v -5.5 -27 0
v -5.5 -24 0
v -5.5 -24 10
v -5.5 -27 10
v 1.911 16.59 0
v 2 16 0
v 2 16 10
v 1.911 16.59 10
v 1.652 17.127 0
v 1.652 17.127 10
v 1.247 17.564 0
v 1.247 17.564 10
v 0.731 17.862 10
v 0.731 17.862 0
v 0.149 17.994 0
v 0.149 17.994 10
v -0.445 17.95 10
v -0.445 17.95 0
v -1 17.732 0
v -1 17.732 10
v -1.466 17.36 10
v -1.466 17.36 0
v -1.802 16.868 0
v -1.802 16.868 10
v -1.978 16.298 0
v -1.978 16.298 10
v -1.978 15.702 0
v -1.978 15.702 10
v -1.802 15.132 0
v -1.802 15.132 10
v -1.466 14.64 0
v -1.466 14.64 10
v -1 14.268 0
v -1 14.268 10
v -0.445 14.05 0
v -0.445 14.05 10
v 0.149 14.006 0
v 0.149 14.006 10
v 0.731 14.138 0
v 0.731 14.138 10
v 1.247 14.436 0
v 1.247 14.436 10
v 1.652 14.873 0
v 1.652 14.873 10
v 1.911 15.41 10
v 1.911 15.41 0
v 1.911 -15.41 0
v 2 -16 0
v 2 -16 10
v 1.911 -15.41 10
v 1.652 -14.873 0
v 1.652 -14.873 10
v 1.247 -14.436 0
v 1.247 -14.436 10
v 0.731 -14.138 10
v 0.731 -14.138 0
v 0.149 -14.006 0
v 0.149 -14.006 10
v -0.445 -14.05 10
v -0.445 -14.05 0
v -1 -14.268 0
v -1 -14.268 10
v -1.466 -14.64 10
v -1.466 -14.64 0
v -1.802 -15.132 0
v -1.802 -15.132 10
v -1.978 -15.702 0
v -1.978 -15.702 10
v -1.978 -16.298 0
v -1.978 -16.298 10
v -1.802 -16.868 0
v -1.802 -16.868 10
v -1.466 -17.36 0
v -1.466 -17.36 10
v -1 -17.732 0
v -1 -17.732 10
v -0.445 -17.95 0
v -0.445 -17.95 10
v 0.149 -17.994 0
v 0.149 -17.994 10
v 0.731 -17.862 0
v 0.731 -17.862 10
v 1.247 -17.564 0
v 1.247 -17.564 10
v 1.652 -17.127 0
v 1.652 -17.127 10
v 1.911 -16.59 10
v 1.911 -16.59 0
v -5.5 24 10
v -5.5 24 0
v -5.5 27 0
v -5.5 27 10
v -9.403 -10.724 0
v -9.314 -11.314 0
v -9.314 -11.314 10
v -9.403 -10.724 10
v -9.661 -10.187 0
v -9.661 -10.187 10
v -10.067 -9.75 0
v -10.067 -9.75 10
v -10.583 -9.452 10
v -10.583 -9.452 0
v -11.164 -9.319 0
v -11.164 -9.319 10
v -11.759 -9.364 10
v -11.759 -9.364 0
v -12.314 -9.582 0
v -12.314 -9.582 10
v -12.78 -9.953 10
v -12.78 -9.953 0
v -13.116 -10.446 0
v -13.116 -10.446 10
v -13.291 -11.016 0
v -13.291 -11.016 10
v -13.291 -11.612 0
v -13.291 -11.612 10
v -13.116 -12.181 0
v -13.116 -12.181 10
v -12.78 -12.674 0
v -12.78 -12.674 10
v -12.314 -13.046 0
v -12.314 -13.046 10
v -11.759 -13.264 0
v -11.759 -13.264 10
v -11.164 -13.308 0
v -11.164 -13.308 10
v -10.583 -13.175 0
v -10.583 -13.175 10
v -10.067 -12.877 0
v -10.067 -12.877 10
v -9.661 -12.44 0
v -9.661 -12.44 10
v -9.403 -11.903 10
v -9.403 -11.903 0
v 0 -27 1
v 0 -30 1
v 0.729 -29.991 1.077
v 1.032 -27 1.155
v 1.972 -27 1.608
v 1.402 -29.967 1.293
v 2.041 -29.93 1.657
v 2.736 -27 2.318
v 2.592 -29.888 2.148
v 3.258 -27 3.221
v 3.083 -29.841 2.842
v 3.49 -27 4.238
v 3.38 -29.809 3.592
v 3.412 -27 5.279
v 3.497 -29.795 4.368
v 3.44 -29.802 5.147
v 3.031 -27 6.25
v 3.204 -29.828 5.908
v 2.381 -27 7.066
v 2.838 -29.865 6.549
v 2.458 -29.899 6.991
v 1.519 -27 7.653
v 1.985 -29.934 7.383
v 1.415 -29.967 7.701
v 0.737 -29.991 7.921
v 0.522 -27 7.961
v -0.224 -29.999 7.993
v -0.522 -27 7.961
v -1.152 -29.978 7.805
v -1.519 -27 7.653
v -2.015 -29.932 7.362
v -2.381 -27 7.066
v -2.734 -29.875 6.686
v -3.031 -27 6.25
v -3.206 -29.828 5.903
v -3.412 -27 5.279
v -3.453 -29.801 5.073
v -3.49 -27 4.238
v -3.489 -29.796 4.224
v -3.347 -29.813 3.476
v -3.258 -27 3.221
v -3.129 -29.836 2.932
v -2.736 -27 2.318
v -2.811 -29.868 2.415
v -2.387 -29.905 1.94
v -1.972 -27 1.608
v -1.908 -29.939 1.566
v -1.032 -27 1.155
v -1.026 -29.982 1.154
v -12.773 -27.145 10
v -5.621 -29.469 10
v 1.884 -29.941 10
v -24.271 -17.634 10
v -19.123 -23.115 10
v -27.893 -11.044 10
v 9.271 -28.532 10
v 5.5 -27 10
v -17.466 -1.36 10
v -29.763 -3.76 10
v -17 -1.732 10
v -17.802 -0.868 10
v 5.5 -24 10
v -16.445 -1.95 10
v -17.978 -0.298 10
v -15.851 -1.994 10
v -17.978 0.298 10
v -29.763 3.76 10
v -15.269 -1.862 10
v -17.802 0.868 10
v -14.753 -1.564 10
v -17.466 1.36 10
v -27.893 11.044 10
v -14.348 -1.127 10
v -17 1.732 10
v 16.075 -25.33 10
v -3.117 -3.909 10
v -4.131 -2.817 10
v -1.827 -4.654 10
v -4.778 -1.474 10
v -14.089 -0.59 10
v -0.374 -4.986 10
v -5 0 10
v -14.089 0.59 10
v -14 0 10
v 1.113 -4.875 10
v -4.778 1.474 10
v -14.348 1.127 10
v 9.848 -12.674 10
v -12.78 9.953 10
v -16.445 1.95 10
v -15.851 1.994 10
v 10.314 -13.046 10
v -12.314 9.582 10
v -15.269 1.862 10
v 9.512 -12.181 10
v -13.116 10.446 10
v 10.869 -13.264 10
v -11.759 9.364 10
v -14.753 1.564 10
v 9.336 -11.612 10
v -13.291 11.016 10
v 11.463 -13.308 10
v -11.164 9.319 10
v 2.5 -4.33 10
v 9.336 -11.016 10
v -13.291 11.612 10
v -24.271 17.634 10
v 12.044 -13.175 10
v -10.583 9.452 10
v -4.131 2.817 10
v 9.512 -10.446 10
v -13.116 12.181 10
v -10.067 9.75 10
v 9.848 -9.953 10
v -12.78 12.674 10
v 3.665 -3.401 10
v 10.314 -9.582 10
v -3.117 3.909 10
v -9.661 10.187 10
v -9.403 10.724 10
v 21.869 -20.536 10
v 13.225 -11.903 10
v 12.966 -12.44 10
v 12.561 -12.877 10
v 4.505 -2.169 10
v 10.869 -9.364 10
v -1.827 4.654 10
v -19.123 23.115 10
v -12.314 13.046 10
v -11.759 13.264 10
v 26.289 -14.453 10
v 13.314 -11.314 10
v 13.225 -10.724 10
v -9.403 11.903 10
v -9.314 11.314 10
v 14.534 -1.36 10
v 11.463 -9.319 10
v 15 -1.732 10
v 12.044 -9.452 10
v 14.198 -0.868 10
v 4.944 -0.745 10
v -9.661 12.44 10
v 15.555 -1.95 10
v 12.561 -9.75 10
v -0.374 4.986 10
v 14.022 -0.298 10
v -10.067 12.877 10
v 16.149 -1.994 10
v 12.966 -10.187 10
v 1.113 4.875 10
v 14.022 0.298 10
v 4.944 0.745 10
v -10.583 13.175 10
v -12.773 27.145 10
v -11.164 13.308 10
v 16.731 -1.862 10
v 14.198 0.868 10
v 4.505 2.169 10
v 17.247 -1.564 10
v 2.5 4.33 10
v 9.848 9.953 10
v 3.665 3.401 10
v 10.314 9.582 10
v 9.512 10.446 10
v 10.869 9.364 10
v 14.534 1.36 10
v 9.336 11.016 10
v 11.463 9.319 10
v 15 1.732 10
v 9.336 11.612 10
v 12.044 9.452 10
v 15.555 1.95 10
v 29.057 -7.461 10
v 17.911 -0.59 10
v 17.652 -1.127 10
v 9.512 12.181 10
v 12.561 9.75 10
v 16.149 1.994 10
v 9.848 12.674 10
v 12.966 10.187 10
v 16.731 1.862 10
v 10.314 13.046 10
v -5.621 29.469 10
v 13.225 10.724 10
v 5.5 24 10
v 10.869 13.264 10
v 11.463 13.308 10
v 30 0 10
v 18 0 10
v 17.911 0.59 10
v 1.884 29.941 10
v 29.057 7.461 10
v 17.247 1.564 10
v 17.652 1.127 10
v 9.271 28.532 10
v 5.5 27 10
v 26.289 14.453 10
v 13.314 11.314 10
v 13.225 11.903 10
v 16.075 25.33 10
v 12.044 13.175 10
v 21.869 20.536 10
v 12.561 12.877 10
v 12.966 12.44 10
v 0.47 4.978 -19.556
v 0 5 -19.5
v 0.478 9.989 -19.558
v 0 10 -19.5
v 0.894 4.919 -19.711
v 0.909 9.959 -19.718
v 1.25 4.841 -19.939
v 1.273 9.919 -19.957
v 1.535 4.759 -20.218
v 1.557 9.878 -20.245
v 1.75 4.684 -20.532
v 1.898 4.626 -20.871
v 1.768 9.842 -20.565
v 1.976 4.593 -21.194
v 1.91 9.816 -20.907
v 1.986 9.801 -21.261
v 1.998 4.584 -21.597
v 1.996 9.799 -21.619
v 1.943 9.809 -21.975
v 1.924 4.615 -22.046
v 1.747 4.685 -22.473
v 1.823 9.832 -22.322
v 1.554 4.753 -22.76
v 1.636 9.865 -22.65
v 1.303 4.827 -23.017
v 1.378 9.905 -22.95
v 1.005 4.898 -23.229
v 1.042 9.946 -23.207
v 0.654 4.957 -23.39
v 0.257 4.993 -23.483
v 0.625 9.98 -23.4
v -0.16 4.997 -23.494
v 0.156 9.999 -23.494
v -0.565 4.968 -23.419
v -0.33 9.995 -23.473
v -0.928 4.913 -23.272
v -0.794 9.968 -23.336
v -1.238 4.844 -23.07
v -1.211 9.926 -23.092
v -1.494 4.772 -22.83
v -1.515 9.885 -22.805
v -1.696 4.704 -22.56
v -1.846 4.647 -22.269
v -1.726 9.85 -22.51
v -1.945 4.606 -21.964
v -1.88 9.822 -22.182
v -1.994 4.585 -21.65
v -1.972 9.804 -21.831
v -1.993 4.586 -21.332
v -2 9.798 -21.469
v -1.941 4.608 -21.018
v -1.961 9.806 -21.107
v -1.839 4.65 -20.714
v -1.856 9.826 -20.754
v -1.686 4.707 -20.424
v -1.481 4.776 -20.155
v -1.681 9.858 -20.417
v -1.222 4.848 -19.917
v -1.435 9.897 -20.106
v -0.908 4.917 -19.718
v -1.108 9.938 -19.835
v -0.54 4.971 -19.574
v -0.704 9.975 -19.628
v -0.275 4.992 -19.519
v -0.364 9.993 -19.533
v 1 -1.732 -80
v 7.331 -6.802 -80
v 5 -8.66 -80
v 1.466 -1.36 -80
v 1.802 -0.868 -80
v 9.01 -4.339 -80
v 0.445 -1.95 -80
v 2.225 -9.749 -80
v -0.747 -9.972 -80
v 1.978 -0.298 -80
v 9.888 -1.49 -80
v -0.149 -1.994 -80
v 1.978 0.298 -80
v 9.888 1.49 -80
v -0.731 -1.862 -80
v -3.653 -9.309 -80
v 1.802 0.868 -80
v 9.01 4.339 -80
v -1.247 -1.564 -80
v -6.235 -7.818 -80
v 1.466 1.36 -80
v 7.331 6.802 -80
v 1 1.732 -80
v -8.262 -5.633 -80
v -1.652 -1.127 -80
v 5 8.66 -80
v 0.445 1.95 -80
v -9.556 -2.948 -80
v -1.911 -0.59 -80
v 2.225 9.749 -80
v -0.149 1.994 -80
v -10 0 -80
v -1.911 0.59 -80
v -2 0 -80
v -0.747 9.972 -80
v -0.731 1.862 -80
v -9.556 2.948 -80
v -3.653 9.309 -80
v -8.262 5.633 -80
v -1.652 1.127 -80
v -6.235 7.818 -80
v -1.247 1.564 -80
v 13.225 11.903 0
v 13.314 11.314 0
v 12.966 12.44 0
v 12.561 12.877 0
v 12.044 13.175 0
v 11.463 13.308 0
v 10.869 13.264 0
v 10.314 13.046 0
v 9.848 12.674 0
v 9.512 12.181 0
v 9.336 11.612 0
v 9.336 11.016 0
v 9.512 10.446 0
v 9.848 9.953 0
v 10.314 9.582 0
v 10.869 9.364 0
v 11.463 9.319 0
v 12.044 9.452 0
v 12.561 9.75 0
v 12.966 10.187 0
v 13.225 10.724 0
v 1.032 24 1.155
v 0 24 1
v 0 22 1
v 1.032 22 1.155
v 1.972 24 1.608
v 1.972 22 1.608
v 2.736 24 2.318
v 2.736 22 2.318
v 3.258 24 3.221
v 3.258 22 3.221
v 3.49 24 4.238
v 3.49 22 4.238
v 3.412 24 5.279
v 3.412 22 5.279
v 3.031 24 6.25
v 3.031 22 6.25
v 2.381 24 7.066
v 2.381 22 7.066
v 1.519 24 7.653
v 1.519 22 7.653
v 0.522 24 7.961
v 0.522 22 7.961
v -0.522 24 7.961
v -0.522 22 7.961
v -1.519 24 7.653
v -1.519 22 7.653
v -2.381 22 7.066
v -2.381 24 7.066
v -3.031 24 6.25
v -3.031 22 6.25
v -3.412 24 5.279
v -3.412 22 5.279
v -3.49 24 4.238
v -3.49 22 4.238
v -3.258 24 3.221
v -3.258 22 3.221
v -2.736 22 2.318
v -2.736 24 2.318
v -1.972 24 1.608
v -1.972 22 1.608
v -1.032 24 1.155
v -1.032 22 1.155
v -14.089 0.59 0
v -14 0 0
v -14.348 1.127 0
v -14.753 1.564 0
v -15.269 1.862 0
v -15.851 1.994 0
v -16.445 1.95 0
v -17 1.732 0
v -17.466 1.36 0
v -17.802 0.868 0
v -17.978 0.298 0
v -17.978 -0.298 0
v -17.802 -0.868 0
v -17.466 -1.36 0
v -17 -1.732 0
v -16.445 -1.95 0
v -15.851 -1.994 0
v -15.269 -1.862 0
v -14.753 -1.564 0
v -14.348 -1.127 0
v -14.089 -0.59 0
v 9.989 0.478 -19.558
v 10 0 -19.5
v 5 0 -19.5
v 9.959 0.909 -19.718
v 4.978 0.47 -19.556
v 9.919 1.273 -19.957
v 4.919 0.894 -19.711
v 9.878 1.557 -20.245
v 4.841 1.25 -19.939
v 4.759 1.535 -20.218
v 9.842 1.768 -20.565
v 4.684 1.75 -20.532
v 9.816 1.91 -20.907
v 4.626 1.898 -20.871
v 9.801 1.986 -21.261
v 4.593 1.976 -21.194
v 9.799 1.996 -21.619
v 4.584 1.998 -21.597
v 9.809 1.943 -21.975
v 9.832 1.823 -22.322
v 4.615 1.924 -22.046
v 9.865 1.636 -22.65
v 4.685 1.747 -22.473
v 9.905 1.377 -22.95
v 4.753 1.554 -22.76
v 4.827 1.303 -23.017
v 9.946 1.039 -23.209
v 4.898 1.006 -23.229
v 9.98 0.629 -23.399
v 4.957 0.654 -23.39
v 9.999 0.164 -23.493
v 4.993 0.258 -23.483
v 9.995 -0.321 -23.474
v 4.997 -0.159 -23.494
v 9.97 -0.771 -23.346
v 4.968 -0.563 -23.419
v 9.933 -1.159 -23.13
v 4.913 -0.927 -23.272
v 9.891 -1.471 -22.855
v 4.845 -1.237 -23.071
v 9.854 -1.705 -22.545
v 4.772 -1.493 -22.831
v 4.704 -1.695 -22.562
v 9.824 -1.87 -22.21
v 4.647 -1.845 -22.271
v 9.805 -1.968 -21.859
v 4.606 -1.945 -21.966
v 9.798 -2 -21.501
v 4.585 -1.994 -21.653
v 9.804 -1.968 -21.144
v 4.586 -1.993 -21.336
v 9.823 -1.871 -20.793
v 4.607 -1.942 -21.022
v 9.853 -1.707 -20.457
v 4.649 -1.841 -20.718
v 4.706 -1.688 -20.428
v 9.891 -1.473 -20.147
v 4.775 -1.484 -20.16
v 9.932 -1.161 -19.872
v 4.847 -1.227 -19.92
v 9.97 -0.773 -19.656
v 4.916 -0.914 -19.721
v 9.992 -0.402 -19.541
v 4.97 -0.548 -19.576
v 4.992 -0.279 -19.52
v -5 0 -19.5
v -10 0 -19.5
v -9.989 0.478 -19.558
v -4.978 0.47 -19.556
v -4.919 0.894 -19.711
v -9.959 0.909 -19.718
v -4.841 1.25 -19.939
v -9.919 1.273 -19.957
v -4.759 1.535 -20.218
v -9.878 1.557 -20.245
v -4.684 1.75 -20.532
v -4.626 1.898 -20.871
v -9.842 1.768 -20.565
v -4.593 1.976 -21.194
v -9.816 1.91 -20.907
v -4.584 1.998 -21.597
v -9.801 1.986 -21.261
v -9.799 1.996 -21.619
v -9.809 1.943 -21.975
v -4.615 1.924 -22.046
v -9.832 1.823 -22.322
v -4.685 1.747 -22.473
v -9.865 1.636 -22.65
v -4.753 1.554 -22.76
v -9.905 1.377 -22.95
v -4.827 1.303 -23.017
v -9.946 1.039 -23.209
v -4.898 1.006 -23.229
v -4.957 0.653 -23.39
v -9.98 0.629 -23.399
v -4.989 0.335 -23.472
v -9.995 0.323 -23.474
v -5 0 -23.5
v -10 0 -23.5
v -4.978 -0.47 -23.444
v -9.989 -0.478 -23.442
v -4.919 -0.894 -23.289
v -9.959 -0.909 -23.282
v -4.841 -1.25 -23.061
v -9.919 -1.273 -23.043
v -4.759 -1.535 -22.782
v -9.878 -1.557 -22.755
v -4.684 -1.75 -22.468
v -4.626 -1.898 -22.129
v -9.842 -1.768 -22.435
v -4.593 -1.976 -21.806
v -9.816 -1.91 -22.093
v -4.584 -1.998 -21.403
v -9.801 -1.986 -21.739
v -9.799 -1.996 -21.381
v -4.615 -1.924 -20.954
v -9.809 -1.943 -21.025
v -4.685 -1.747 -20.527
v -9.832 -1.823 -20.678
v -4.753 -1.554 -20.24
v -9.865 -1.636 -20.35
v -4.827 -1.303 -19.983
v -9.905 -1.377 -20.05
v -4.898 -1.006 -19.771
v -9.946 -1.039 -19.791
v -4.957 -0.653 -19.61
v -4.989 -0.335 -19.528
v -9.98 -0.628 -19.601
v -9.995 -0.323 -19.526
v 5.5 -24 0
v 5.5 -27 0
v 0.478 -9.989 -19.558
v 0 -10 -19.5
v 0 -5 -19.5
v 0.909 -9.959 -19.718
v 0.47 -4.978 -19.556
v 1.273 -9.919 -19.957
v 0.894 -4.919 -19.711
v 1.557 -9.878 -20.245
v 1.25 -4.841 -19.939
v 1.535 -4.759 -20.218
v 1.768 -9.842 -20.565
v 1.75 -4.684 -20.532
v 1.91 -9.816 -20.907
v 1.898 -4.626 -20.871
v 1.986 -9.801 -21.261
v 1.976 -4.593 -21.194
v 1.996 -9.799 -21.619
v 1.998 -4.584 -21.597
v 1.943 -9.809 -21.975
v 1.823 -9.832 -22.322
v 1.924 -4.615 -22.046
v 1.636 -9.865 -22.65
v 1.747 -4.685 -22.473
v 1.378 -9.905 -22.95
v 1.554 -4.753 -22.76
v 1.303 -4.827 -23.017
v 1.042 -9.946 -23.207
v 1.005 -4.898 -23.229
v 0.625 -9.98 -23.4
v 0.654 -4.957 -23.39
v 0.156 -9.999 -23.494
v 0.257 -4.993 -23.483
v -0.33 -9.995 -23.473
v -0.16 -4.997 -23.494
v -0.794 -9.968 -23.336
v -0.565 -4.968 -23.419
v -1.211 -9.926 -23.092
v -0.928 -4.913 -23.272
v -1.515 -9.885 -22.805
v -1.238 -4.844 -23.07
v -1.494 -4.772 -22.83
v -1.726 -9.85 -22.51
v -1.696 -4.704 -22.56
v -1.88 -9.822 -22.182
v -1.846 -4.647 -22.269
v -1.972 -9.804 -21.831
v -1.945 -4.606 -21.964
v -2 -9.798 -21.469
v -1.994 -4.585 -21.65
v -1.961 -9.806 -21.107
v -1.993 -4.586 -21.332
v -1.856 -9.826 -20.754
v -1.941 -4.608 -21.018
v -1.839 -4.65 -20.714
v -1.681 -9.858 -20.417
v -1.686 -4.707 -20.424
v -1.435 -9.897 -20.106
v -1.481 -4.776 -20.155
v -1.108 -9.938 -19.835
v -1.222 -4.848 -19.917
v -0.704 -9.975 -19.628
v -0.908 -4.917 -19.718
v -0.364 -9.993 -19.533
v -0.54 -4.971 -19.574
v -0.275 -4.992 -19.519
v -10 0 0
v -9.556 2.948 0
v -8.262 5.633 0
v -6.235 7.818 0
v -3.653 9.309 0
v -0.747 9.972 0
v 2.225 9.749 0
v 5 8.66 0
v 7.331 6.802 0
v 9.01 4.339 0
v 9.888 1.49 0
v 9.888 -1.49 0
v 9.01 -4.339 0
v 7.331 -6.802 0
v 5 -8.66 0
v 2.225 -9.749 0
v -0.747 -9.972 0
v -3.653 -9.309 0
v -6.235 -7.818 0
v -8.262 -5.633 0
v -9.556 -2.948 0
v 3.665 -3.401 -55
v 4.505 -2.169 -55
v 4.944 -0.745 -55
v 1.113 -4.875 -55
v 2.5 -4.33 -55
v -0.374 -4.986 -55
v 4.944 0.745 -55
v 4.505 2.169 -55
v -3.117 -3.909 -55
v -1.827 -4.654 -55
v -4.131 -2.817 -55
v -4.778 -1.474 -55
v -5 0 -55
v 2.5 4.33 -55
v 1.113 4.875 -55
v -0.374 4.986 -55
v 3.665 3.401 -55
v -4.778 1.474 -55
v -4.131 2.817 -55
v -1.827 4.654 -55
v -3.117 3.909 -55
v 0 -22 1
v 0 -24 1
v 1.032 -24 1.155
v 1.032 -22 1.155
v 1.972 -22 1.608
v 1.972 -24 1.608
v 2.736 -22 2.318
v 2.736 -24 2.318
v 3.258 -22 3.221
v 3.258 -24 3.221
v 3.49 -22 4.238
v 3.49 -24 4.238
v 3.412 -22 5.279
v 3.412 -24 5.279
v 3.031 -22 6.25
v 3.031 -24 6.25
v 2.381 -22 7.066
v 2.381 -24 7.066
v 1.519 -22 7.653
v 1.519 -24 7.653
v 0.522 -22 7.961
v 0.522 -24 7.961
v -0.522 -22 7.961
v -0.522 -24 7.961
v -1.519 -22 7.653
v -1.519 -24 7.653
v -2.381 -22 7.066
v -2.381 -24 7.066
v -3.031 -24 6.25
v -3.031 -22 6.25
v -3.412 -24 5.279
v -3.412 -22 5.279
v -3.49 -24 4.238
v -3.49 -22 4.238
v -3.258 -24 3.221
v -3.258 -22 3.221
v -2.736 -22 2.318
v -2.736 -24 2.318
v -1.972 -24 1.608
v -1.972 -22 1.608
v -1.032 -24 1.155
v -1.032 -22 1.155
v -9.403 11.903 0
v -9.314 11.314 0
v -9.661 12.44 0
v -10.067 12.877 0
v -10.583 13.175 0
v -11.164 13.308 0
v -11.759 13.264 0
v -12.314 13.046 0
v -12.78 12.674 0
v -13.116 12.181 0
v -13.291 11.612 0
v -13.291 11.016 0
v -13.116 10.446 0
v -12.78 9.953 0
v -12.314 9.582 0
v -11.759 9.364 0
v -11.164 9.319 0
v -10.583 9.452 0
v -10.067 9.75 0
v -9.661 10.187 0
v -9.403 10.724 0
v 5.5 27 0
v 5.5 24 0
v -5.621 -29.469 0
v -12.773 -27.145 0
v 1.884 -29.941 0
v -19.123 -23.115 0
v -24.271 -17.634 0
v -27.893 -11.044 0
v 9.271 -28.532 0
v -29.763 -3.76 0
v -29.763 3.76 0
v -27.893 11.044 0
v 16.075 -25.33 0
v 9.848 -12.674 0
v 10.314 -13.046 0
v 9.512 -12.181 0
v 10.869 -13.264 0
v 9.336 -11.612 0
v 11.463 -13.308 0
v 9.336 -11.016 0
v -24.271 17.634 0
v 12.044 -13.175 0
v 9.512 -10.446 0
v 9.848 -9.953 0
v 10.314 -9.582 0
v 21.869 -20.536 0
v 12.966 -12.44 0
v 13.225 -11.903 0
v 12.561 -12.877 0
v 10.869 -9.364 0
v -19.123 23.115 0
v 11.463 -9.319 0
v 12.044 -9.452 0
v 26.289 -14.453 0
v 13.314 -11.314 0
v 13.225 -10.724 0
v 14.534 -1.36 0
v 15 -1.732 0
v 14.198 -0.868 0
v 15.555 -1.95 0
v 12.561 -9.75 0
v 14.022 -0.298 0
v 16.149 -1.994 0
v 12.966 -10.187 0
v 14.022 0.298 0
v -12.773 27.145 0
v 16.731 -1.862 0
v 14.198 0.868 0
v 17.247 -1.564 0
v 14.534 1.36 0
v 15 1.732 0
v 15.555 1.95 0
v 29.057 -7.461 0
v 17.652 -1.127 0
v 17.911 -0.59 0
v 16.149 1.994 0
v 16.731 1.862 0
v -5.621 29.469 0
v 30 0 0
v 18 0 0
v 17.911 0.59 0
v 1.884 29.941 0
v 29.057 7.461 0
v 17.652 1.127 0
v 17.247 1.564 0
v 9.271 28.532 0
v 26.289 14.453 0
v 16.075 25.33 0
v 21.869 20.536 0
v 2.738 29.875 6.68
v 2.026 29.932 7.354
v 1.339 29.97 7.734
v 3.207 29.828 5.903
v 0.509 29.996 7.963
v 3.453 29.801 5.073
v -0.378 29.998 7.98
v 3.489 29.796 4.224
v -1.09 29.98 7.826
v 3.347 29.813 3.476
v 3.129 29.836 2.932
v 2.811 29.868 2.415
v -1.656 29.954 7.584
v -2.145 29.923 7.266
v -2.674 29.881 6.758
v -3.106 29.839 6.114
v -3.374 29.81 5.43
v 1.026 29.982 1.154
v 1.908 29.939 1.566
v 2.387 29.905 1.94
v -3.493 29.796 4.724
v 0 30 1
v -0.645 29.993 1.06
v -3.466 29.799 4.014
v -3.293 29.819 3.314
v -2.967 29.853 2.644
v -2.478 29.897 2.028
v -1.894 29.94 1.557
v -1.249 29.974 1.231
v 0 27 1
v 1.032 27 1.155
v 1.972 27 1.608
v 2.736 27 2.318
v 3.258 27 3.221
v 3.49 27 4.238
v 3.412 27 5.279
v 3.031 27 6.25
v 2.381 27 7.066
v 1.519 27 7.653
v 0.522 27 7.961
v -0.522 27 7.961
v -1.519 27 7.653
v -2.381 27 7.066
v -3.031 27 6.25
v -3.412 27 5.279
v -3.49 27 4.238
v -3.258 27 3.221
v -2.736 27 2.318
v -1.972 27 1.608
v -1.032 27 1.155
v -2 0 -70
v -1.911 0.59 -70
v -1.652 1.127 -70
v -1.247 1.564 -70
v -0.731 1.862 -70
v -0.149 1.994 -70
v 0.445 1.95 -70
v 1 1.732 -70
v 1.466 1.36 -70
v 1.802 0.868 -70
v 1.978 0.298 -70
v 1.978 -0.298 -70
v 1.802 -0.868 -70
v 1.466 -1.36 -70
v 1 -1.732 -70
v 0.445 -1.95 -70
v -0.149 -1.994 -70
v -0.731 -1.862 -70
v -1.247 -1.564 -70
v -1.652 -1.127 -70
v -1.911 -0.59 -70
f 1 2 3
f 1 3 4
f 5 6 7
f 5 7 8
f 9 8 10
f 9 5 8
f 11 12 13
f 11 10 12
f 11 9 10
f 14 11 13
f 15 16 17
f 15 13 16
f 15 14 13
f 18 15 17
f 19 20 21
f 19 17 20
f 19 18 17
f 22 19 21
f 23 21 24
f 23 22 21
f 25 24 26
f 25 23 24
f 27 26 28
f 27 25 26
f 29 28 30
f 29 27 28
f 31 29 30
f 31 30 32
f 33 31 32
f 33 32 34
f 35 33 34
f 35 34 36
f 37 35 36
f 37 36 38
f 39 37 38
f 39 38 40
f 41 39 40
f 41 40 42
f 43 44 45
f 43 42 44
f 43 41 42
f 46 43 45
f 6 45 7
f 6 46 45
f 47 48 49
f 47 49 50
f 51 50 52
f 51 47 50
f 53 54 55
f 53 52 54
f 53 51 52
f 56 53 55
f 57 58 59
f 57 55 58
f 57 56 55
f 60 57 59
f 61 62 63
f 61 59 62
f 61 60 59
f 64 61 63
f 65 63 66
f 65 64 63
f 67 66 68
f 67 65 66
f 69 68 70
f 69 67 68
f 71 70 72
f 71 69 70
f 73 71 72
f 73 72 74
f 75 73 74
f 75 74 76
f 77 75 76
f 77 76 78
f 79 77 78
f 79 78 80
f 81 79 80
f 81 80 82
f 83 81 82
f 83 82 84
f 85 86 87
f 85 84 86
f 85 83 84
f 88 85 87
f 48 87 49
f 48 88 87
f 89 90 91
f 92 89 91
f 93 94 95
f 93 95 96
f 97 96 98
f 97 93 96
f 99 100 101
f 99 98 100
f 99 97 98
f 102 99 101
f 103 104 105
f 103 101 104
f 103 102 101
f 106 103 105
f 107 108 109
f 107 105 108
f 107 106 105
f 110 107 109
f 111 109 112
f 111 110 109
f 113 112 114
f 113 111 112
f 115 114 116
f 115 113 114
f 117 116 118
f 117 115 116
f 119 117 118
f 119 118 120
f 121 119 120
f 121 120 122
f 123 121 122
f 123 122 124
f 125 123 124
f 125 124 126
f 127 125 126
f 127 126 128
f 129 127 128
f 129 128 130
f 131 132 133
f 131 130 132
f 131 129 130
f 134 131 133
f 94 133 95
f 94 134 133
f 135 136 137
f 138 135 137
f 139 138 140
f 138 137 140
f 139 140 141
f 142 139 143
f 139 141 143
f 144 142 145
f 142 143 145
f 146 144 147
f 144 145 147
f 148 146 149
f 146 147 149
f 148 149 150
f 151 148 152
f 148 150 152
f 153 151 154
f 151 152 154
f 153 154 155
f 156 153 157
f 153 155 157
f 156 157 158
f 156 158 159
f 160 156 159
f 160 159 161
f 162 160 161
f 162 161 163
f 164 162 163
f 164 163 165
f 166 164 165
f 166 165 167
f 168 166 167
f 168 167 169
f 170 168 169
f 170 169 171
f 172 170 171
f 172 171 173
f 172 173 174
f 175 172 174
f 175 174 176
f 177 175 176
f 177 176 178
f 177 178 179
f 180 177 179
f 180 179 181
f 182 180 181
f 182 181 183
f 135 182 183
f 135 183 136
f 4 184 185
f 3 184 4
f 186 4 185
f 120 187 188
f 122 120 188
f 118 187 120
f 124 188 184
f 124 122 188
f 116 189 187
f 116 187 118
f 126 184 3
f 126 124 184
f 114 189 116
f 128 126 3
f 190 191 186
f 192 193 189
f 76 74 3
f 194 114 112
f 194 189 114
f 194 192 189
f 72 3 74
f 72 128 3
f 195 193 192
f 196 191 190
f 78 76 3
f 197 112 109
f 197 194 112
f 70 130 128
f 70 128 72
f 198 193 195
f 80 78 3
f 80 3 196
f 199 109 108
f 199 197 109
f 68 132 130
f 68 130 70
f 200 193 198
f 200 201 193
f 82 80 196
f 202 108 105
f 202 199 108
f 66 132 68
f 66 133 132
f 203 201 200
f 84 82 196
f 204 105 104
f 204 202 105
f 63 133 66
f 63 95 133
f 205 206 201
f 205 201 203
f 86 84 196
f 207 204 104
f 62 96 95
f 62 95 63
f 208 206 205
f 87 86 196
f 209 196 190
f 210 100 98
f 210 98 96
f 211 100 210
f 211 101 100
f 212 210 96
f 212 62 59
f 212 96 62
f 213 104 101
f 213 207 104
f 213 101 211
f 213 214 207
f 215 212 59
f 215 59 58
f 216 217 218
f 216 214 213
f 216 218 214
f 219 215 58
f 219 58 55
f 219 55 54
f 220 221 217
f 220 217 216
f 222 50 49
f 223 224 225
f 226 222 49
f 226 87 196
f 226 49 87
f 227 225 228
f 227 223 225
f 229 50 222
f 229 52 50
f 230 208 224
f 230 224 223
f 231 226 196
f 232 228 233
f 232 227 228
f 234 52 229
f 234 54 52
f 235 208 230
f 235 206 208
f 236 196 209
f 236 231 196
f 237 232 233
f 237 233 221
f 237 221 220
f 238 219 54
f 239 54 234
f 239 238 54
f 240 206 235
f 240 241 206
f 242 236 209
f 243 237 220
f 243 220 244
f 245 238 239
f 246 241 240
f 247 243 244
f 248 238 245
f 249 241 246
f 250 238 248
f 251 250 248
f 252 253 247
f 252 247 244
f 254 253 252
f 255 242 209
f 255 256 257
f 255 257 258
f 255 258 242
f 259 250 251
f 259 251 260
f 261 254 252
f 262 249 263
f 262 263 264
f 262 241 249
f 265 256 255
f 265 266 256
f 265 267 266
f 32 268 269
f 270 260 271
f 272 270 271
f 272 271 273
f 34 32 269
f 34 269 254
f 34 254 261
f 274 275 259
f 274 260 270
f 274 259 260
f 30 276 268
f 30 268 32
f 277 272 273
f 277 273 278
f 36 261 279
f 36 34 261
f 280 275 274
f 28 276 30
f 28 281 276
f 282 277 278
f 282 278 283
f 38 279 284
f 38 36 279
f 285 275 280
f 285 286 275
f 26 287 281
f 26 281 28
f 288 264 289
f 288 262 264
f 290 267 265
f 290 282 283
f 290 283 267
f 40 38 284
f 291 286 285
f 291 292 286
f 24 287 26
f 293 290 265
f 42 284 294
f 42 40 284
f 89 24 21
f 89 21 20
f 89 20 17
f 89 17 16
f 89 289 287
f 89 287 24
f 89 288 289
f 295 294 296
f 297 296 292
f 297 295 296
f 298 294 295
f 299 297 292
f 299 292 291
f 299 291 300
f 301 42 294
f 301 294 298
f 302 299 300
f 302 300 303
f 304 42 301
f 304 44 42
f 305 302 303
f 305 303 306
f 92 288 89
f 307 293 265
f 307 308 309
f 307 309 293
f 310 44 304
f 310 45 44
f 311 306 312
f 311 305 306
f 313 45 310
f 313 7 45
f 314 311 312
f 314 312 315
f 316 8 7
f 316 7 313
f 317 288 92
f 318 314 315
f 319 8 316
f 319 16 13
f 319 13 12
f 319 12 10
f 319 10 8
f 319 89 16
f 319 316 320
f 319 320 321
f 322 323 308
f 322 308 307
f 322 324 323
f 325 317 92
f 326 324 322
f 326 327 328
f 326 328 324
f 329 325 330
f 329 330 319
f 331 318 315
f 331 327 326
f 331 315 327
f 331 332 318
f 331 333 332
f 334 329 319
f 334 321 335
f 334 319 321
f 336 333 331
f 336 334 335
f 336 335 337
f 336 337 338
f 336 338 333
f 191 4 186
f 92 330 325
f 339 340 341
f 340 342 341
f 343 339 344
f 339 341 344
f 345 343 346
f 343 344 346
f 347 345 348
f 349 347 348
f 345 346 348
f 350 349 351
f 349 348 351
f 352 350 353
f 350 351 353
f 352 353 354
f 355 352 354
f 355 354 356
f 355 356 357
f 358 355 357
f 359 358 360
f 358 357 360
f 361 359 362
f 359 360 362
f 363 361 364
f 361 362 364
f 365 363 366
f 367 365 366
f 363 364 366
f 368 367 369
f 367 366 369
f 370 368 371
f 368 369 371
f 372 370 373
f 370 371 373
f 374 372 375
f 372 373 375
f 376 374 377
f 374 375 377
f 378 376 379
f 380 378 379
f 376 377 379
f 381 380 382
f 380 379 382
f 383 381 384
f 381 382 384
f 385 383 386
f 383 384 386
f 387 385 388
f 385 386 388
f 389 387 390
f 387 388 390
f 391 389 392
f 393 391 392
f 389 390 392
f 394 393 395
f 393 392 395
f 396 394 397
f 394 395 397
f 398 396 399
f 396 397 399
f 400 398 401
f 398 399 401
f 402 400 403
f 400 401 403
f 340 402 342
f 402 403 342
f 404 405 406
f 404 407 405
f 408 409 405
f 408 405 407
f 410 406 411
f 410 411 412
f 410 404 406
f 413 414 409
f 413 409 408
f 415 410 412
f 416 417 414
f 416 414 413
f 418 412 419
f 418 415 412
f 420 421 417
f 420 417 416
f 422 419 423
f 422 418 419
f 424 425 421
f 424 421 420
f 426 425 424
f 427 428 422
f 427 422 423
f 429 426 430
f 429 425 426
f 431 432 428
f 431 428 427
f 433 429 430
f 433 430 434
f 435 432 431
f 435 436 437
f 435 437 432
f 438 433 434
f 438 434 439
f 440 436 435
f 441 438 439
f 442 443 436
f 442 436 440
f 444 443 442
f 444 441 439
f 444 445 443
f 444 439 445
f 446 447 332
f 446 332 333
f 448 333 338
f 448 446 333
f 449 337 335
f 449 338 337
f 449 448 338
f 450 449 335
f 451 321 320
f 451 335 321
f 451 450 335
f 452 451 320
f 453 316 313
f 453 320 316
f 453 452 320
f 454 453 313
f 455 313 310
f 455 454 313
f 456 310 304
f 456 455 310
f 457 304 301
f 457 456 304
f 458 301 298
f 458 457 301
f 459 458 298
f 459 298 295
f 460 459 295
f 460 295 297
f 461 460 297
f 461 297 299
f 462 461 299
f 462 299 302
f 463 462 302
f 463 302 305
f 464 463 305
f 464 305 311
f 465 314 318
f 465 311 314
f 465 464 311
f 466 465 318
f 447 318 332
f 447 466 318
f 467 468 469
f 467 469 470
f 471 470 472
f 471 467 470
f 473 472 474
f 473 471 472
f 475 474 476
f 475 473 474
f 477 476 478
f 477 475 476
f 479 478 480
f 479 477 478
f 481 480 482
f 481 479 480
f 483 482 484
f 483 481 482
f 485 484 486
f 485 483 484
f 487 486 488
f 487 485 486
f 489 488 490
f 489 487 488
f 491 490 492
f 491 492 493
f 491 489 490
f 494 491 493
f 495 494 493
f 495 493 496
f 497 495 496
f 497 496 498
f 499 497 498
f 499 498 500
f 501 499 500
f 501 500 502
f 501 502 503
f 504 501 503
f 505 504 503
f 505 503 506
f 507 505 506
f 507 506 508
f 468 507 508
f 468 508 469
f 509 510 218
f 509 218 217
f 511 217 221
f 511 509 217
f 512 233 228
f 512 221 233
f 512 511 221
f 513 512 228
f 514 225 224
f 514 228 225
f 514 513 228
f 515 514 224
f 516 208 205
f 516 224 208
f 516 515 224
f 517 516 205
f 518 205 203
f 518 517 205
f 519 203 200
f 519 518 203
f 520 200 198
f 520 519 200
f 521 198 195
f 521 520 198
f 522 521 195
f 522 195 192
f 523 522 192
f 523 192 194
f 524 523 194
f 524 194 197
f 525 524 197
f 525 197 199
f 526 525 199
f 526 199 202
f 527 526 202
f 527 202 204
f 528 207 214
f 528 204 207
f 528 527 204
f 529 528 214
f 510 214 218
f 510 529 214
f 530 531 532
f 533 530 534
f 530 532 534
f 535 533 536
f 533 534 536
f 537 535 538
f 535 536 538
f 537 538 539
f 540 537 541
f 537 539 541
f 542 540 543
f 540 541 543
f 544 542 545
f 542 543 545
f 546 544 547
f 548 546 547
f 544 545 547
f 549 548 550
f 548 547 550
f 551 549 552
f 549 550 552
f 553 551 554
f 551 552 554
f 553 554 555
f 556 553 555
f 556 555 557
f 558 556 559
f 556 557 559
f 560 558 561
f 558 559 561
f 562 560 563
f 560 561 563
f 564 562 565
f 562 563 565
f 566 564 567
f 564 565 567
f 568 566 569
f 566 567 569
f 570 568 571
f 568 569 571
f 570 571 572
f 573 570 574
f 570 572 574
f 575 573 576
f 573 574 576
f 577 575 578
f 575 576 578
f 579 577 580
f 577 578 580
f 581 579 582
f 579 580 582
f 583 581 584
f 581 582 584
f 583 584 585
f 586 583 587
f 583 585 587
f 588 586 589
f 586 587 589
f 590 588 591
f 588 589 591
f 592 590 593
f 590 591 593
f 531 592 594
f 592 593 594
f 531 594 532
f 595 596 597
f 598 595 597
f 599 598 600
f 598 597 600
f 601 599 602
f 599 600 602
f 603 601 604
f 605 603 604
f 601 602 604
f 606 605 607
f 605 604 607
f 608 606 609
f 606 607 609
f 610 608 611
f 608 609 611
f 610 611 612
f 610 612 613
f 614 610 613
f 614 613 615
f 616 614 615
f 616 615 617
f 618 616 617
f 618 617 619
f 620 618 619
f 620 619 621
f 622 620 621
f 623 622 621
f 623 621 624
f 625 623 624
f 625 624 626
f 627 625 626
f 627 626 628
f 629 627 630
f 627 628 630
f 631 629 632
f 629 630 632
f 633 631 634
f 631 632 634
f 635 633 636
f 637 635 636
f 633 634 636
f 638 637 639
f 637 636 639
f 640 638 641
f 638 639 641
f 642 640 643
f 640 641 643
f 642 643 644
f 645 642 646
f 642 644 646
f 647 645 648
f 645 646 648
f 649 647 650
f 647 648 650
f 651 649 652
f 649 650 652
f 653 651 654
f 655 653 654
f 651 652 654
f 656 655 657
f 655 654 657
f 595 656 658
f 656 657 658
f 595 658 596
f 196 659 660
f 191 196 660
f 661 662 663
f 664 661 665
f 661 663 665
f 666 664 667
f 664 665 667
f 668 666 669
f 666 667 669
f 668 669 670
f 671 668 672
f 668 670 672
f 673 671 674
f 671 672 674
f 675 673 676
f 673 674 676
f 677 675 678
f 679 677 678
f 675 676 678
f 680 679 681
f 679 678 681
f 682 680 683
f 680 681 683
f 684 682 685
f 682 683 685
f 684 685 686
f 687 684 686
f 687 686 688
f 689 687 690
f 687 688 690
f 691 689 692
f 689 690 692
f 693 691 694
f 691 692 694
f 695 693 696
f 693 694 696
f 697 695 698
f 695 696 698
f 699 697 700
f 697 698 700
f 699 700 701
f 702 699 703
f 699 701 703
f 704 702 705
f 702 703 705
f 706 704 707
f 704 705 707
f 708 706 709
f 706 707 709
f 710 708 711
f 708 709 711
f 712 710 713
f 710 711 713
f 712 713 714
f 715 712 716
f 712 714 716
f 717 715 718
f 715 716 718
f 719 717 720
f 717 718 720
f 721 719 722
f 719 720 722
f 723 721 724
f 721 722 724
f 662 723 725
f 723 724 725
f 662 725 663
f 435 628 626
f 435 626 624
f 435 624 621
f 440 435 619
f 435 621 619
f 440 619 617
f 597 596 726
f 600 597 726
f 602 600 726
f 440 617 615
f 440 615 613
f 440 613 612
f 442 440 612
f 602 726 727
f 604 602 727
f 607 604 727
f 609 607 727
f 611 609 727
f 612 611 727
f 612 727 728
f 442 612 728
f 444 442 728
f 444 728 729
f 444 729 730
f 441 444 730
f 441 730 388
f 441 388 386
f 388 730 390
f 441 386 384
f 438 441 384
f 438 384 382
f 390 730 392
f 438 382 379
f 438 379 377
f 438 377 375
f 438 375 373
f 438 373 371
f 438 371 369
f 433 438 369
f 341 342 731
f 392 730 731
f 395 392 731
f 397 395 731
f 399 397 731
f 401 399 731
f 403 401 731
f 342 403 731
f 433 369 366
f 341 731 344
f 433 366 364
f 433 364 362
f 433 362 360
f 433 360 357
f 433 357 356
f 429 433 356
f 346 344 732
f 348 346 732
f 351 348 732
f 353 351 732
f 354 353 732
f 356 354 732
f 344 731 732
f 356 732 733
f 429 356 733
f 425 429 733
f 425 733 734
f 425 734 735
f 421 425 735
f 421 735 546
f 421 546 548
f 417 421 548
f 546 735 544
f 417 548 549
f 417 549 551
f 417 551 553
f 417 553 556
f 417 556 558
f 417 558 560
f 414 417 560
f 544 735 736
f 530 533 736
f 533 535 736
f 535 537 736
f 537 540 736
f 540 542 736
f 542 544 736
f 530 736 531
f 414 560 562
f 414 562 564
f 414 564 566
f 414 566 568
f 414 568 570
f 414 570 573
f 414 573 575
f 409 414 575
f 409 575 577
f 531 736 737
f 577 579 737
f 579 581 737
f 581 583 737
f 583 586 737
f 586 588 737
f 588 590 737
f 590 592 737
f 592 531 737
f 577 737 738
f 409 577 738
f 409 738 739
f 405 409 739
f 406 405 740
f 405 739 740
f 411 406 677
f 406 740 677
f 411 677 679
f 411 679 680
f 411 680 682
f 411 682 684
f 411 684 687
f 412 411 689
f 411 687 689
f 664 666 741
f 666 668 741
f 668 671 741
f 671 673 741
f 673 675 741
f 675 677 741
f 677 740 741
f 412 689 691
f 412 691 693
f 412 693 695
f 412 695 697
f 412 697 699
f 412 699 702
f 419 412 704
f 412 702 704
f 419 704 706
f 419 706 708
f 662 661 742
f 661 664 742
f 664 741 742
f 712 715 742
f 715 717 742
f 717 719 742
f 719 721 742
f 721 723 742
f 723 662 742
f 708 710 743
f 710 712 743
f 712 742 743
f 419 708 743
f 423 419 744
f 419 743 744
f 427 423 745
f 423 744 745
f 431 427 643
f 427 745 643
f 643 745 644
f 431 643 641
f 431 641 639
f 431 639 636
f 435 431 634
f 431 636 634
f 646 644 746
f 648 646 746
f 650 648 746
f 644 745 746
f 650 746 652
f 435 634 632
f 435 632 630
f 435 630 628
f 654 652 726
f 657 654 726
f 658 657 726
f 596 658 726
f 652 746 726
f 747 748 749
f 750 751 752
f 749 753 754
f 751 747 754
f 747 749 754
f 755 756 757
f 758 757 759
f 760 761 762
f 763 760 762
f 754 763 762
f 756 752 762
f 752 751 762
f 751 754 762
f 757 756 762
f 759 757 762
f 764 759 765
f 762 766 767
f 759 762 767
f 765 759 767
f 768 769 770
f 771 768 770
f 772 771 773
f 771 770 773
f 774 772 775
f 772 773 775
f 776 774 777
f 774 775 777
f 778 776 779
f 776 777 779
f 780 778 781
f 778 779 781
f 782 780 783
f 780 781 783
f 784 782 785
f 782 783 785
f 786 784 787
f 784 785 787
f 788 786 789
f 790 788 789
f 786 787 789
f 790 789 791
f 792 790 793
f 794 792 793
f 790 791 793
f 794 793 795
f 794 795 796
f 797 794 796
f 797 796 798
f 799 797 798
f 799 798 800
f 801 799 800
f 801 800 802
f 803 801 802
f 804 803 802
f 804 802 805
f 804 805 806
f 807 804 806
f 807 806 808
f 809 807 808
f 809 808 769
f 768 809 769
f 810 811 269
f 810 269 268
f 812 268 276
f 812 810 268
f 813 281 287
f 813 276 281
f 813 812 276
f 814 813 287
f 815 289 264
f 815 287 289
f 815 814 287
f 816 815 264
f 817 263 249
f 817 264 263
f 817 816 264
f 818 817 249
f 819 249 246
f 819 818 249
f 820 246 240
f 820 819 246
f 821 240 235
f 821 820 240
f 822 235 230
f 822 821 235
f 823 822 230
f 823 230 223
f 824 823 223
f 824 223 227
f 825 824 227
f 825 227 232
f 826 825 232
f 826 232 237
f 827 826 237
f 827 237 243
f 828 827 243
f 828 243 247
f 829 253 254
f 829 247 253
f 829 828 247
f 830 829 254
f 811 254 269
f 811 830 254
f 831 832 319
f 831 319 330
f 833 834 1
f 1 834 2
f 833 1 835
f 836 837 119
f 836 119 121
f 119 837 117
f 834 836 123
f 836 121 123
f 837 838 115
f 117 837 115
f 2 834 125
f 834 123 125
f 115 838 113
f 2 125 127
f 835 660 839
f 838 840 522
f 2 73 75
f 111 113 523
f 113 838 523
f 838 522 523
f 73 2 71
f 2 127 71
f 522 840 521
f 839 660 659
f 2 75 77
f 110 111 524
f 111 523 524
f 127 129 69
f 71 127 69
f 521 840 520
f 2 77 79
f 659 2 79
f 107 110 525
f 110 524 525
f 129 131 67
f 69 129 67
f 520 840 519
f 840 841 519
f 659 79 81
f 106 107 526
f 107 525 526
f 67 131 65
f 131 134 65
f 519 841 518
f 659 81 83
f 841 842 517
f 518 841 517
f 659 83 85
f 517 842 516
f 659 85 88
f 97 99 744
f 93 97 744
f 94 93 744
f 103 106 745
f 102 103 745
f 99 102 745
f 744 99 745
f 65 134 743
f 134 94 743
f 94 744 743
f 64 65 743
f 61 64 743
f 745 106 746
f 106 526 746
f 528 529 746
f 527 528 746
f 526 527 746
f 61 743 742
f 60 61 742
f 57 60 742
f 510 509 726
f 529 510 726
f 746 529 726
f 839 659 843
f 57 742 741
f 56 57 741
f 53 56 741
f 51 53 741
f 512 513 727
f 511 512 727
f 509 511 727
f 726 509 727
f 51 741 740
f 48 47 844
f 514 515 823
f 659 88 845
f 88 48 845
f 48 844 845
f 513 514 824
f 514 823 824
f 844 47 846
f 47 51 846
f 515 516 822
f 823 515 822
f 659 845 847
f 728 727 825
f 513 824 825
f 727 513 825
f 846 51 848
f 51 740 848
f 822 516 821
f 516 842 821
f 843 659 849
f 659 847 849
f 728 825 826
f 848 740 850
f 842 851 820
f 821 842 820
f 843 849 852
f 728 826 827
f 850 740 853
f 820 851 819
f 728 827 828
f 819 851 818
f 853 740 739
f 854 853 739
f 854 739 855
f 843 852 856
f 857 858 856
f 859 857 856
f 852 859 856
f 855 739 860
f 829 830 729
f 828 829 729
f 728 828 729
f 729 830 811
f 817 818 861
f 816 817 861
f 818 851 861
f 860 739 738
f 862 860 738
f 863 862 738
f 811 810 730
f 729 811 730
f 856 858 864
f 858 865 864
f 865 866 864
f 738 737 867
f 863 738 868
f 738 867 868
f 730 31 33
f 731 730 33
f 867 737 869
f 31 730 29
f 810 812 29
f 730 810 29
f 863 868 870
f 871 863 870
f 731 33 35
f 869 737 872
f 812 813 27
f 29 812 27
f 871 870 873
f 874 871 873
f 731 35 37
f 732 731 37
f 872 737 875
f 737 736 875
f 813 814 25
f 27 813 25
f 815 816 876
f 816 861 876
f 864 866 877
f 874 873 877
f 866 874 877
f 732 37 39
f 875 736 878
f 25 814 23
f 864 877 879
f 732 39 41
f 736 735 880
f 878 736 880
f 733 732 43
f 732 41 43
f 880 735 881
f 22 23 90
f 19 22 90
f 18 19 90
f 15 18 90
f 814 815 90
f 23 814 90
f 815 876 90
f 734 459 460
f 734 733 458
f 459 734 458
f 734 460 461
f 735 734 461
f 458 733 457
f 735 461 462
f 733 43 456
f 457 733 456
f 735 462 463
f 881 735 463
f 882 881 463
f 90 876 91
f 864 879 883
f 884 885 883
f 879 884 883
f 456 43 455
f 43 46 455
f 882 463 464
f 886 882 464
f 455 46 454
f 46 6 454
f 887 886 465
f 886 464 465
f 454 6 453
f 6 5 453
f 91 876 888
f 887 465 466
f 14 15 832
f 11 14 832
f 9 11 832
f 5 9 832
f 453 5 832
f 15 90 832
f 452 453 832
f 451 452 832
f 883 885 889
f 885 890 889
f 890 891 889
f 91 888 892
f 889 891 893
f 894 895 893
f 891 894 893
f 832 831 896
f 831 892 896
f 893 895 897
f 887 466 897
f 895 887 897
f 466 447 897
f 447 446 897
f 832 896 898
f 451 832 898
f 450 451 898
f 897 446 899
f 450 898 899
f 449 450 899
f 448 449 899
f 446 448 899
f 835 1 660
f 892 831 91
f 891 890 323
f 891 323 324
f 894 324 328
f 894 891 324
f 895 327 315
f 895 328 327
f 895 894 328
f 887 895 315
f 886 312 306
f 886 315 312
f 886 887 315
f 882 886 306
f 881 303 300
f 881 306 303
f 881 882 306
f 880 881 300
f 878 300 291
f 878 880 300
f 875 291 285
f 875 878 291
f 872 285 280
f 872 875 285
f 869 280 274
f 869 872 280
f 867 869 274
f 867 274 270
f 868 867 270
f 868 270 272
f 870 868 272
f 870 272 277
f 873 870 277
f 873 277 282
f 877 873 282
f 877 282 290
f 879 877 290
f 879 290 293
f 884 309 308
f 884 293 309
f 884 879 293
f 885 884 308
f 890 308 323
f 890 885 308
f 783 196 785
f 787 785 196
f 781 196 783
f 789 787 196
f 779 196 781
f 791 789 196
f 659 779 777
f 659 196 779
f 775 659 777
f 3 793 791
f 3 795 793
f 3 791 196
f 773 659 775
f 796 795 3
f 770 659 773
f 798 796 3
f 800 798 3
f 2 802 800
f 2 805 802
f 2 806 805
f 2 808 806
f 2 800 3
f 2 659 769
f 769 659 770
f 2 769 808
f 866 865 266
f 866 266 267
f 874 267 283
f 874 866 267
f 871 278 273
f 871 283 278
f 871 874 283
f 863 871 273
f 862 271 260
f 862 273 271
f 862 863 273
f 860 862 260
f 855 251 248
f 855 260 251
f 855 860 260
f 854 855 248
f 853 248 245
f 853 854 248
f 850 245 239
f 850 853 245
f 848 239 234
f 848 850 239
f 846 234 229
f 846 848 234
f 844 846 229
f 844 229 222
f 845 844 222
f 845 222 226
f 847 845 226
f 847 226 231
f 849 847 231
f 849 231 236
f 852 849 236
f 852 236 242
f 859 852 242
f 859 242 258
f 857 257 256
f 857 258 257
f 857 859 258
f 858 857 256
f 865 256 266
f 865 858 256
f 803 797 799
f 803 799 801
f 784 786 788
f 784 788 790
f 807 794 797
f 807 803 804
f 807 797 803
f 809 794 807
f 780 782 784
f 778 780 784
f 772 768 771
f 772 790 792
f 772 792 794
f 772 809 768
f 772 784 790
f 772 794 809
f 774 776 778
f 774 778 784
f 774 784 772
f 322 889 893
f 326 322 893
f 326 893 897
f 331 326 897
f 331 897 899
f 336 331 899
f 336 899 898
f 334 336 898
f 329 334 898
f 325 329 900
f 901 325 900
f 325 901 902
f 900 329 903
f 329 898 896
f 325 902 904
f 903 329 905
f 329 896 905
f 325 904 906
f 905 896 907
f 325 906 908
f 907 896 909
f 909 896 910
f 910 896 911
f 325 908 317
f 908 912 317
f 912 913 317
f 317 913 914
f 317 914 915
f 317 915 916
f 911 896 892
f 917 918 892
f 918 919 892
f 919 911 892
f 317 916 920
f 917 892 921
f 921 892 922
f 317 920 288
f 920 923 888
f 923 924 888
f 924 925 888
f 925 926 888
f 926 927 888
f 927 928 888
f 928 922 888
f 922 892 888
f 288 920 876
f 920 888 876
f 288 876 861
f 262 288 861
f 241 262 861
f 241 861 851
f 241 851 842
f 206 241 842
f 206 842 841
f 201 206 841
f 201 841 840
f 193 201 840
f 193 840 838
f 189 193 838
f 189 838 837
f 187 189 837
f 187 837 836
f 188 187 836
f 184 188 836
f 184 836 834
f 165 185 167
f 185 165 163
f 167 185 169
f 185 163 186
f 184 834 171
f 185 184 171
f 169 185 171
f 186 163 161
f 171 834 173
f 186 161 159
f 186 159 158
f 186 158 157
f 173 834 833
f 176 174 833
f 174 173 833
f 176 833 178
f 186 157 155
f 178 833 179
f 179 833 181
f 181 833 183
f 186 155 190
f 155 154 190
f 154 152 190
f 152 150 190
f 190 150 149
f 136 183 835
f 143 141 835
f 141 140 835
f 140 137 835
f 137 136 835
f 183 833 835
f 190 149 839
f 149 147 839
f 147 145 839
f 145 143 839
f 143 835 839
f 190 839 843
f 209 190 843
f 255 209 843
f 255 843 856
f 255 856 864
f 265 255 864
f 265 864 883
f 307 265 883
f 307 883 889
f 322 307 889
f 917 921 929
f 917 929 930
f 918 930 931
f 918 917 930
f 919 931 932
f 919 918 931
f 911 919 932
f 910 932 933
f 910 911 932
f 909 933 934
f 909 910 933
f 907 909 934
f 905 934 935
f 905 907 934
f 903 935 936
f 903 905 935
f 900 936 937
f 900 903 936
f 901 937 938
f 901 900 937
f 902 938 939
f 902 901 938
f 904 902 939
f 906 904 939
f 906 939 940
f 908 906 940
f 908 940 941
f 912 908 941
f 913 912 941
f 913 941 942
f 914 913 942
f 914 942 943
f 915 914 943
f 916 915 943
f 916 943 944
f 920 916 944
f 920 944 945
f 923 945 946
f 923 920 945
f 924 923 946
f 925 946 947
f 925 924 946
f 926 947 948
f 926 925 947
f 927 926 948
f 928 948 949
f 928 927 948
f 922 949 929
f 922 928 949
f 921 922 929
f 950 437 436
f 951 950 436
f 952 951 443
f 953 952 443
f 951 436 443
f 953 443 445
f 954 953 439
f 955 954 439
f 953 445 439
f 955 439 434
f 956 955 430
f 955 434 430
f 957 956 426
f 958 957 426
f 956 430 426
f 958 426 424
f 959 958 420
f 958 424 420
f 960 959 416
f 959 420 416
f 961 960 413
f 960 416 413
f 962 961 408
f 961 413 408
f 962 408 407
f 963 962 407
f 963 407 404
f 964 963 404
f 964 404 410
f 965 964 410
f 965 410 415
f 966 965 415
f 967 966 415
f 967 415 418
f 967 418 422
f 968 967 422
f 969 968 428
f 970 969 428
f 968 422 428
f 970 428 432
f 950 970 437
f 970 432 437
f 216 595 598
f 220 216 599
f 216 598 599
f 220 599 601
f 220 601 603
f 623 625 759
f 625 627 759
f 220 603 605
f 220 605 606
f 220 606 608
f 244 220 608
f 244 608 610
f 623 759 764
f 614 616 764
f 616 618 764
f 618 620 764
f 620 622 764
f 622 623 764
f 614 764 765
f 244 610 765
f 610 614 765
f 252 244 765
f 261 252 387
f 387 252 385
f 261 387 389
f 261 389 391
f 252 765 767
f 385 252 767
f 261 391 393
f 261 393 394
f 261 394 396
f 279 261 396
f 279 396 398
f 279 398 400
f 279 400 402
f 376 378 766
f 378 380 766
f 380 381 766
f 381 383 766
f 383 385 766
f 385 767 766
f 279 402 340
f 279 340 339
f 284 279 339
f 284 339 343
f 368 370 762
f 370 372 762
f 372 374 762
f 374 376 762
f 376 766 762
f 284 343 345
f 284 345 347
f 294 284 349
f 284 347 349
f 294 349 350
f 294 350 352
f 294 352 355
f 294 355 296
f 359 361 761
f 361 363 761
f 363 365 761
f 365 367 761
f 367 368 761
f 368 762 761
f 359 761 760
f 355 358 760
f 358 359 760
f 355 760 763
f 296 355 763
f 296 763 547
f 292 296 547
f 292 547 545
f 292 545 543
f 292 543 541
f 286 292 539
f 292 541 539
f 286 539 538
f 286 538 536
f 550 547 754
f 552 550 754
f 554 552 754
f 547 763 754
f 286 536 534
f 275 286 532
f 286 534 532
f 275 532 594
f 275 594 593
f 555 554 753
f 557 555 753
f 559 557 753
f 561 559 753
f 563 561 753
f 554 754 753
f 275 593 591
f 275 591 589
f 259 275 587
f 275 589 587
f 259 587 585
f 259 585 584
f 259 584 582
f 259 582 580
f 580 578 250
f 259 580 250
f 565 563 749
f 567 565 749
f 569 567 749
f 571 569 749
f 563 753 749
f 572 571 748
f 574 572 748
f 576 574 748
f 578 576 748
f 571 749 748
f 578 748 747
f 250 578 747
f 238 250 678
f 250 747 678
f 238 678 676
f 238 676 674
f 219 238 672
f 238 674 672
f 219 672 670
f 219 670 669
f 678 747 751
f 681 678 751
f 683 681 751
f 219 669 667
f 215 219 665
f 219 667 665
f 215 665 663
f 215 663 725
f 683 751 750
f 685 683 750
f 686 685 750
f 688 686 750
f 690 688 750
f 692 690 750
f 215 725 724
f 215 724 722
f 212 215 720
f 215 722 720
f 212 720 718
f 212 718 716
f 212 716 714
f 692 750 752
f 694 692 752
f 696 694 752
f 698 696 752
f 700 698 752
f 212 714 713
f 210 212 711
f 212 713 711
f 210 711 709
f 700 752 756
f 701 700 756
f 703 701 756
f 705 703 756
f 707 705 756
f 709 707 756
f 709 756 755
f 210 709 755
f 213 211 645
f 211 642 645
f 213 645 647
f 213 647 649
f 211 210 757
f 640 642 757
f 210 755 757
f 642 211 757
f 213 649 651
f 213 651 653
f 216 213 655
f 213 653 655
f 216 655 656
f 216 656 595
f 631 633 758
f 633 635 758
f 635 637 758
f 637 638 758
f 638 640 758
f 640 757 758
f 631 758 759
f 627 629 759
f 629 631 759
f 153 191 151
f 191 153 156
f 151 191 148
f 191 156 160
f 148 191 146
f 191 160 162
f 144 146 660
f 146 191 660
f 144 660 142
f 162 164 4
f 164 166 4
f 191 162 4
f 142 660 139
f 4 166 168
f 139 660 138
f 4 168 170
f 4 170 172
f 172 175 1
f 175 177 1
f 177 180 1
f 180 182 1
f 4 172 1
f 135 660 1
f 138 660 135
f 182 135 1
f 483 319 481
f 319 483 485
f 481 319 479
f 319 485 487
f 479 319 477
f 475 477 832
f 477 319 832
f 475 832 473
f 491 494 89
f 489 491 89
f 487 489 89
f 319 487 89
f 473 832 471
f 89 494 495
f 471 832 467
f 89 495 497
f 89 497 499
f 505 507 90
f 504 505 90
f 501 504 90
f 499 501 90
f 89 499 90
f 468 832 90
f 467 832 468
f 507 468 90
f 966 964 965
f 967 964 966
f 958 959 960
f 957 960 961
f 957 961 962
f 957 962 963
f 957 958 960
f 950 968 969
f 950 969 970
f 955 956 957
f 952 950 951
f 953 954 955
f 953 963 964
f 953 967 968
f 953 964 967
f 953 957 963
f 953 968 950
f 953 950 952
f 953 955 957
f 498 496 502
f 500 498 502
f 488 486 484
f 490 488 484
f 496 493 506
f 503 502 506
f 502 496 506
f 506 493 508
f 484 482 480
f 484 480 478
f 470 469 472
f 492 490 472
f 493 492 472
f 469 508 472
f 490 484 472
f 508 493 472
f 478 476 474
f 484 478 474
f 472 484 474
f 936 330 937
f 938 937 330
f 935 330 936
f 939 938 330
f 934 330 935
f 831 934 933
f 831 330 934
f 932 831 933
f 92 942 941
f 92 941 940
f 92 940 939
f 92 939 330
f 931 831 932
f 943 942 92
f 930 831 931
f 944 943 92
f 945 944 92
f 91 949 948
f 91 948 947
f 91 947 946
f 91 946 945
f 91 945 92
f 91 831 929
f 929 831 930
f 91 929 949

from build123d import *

# Parameters (mm, degrees)
SKETCH1_R               = 30
BOSS_EXTRUDE1_DEPTH     = 10
SKETCH2_R               = 10
BOSS_EXTRUDE2_DEPTH     = 80
SKETCH2_2_R             = 10
BOSS_EXTRUDE3_DEPTH     = 20
SKETCH5_R               = 5
CUT_EXTRUDE1_DEPTH      = 100.498743711
SKETCH6_R               = 2
CUT_EXTRUDE2_DEPTH      = 91.553851381
CIRPATTERN1_COUNT       = 2
CIRPATTERN1_ANGLE       = 90
CUT_EXTRUDE3_DEPTH      = 100.498743801
CUT_EXTRUDE3_DEPTH_BACK = 100.498743801
SKETCH7_R               = 2
SKETCH9_W               = 11
SKETCH9_H               = 3
CUT_EXTRUDE5_DEPTH      = 10
SKETCH10_R              = 3.5
CUT_EXTRUDE6_DEPTH      = 8
SKETCH17_R              = 7.355644599
BOSS_EXTRUDE4_DEPTH     = 25
SKETCH18_R              = 2
CUT_EXTRUDE7_DEPTH      = 10


with BuildPart() as part:
    # Sketch1 → Boss-Extrude1 (new body)
    with BuildSketch(Plane.XY):
        Circle(SKETCH1_R)
    extrude(amount=BOSS_EXTRUDE1_DEPTH)

    # Sketch2 → Boss-Extrude2 (add)
    with BuildSketch(Plane(origin=(0, 0, 0), x_dir=(-1, 0, 0), z_dir=(0, 0, -1))):
        Circle(SKETCH2_R)
    extrude(amount=BOSS_EXTRUDE2_DEPTH)

    # Sketch2<2> → Boss-Extrude3 (add)
    with BuildSketch(Plane(origin=(0, 0, 0), x_dir=(-1, 0, 0), z_dir=(0, 0, -1))):
        Circle(SKETCH2_2_R)
    extrude(amount=BOSS_EXTRUDE3_DEPTH)

    # Sketch5 → Cut-Extrude1 (cut, through all)
    with BuildSketch(Plane(origin=(0, 0, -80), x_dir=(-1, 0, 0), z_dir=(0, 0, -1))):
        Circle(SKETCH5_R)
    extrude(amount=-CUT_EXTRUDE1_DEPTH, mode=Mode.SUBTRACT)

    # Sketch6 → Cut-Extrude2 (cut, symmetric)
    with BuildSketch(Plane(origin=(0, 0, 0), x_dir=(1, 0, 0), z_dir=(0, 1, 0))):
        with Locations((0, 21.5)):
            Circle(SKETCH6_R)
    cut_extrude2 = extrude(amount=CUT_EXTRUDE2_DEPTH, both=True, mode=Mode.SUBTRACT)

    # CirPattern1: Cut-Extrude2 ×2 about axis
    cirpattern1_axis = Axis((0, 0, -80), (0, 0, 1))
    for i in range(1, CIRPATTERN1_COUNT):
        add(cut_extrude2.rotate(cirpattern1_axis, i * CIRPATTERN1_ANGLE / (CIRPATTERN1_COUNT - 1)), mode=Mode.SUBTRACT)

    # Sketch7 → Cut-Extrude3 (cut, two sides: drawn at the far end of the back side and taken through both)
    with BuildSketch(Plane.XY.offset(10).offset(-CUT_EXTRUDE3_DEPTH_BACK)):
        with Locations((0, 16)):
            Circle(SKETCH7_R)
        with Locations((11.313708499, 11.313708499)):
            Circle(SKETCH7_R)
        with Locations((16, 0)):
            Circle(SKETCH7_R)
        with Locations((11.313708499, -11.313708499)):
            Circle(SKETCH7_R)
        with Locations((0, -16)):
            Circle(SKETCH7_R)
        with Locations((-11.313708499, -11.313708499)):
            Circle(SKETCH7_R)
        with Locations((-16, 0)):
            Circle(SKETCH7_R)
        with Locations((-11.313708499, 11.313708499)):
            Circle(SKETCH7_R)
    extrude(amount=CUT_EXTRUDE3_DEPTH + CUT_EXTRUDE3_DEPTH_BACK, mode=Mode.SUBTRACT)

    # Sketch9 → Cut-Extrude5 (cut)
    with BuildSketch(Plane(origin=(0, 0, 0), x_dir=(-1, 0, 0), z_dir=(0, 0, -1))):
        with Locations((0, 25.5)):
            Rectangle(SKETCH9_W, SKETCH9_H)
    cut_extrude5 = extrude(amount=-CUT_EXTRUDE5_DEPTH, mode=Mode.SUBTRACT)

    # Mirror1: Cut-Extrude5 across plane
    add(cut_extrude5.mirror(Plane.ZX), mode=Mode.SUBTRACT)

    # Sketch10 → Cut-Extrude6 (cut)
    with BuildSketch(Plane(origin=(0, -30, 0), x_dir=(-1, 0, 0), z_dir=(0, -1, 0))):
        with Locations((0, -4.5)):
            Circle(SKETCH10_R)
    cut_extrude6 = extrude(amount=-CUT_EXTRUDE6_DEPTH, mode=Mode.SUBTRACT)

    # Mirror2: Cut-Extrude6 across plane
    add(cut_extrude6.mirror(Plane.ZX), mode=Mode.SUBTRACT)

    # Sketch17 → Boss-Extrude4 (add)
    with BuildSketch(Plane(origin=(0, 0, -55), x_dir=(-1, 0, 0), z_dir=(0, 0, -1))):
        Circle(SKETCH17_R)
    extrude(amount=BOSS_EXTRUDE4_DEPTH)

    # Sketch18 → Cut-Extrude7 (cut)
    with BuildSketch(Plane(origin=(0, 0, -80), x_dir=(-1, 0, 0), z_dir=(0, 0, -1))):
        Circle(SKETCH18_R)
    extrude(amount=-CUT_EXTRUDE7_DEPTH, mode=Mode.SUBTRACT)


solid = part.part
